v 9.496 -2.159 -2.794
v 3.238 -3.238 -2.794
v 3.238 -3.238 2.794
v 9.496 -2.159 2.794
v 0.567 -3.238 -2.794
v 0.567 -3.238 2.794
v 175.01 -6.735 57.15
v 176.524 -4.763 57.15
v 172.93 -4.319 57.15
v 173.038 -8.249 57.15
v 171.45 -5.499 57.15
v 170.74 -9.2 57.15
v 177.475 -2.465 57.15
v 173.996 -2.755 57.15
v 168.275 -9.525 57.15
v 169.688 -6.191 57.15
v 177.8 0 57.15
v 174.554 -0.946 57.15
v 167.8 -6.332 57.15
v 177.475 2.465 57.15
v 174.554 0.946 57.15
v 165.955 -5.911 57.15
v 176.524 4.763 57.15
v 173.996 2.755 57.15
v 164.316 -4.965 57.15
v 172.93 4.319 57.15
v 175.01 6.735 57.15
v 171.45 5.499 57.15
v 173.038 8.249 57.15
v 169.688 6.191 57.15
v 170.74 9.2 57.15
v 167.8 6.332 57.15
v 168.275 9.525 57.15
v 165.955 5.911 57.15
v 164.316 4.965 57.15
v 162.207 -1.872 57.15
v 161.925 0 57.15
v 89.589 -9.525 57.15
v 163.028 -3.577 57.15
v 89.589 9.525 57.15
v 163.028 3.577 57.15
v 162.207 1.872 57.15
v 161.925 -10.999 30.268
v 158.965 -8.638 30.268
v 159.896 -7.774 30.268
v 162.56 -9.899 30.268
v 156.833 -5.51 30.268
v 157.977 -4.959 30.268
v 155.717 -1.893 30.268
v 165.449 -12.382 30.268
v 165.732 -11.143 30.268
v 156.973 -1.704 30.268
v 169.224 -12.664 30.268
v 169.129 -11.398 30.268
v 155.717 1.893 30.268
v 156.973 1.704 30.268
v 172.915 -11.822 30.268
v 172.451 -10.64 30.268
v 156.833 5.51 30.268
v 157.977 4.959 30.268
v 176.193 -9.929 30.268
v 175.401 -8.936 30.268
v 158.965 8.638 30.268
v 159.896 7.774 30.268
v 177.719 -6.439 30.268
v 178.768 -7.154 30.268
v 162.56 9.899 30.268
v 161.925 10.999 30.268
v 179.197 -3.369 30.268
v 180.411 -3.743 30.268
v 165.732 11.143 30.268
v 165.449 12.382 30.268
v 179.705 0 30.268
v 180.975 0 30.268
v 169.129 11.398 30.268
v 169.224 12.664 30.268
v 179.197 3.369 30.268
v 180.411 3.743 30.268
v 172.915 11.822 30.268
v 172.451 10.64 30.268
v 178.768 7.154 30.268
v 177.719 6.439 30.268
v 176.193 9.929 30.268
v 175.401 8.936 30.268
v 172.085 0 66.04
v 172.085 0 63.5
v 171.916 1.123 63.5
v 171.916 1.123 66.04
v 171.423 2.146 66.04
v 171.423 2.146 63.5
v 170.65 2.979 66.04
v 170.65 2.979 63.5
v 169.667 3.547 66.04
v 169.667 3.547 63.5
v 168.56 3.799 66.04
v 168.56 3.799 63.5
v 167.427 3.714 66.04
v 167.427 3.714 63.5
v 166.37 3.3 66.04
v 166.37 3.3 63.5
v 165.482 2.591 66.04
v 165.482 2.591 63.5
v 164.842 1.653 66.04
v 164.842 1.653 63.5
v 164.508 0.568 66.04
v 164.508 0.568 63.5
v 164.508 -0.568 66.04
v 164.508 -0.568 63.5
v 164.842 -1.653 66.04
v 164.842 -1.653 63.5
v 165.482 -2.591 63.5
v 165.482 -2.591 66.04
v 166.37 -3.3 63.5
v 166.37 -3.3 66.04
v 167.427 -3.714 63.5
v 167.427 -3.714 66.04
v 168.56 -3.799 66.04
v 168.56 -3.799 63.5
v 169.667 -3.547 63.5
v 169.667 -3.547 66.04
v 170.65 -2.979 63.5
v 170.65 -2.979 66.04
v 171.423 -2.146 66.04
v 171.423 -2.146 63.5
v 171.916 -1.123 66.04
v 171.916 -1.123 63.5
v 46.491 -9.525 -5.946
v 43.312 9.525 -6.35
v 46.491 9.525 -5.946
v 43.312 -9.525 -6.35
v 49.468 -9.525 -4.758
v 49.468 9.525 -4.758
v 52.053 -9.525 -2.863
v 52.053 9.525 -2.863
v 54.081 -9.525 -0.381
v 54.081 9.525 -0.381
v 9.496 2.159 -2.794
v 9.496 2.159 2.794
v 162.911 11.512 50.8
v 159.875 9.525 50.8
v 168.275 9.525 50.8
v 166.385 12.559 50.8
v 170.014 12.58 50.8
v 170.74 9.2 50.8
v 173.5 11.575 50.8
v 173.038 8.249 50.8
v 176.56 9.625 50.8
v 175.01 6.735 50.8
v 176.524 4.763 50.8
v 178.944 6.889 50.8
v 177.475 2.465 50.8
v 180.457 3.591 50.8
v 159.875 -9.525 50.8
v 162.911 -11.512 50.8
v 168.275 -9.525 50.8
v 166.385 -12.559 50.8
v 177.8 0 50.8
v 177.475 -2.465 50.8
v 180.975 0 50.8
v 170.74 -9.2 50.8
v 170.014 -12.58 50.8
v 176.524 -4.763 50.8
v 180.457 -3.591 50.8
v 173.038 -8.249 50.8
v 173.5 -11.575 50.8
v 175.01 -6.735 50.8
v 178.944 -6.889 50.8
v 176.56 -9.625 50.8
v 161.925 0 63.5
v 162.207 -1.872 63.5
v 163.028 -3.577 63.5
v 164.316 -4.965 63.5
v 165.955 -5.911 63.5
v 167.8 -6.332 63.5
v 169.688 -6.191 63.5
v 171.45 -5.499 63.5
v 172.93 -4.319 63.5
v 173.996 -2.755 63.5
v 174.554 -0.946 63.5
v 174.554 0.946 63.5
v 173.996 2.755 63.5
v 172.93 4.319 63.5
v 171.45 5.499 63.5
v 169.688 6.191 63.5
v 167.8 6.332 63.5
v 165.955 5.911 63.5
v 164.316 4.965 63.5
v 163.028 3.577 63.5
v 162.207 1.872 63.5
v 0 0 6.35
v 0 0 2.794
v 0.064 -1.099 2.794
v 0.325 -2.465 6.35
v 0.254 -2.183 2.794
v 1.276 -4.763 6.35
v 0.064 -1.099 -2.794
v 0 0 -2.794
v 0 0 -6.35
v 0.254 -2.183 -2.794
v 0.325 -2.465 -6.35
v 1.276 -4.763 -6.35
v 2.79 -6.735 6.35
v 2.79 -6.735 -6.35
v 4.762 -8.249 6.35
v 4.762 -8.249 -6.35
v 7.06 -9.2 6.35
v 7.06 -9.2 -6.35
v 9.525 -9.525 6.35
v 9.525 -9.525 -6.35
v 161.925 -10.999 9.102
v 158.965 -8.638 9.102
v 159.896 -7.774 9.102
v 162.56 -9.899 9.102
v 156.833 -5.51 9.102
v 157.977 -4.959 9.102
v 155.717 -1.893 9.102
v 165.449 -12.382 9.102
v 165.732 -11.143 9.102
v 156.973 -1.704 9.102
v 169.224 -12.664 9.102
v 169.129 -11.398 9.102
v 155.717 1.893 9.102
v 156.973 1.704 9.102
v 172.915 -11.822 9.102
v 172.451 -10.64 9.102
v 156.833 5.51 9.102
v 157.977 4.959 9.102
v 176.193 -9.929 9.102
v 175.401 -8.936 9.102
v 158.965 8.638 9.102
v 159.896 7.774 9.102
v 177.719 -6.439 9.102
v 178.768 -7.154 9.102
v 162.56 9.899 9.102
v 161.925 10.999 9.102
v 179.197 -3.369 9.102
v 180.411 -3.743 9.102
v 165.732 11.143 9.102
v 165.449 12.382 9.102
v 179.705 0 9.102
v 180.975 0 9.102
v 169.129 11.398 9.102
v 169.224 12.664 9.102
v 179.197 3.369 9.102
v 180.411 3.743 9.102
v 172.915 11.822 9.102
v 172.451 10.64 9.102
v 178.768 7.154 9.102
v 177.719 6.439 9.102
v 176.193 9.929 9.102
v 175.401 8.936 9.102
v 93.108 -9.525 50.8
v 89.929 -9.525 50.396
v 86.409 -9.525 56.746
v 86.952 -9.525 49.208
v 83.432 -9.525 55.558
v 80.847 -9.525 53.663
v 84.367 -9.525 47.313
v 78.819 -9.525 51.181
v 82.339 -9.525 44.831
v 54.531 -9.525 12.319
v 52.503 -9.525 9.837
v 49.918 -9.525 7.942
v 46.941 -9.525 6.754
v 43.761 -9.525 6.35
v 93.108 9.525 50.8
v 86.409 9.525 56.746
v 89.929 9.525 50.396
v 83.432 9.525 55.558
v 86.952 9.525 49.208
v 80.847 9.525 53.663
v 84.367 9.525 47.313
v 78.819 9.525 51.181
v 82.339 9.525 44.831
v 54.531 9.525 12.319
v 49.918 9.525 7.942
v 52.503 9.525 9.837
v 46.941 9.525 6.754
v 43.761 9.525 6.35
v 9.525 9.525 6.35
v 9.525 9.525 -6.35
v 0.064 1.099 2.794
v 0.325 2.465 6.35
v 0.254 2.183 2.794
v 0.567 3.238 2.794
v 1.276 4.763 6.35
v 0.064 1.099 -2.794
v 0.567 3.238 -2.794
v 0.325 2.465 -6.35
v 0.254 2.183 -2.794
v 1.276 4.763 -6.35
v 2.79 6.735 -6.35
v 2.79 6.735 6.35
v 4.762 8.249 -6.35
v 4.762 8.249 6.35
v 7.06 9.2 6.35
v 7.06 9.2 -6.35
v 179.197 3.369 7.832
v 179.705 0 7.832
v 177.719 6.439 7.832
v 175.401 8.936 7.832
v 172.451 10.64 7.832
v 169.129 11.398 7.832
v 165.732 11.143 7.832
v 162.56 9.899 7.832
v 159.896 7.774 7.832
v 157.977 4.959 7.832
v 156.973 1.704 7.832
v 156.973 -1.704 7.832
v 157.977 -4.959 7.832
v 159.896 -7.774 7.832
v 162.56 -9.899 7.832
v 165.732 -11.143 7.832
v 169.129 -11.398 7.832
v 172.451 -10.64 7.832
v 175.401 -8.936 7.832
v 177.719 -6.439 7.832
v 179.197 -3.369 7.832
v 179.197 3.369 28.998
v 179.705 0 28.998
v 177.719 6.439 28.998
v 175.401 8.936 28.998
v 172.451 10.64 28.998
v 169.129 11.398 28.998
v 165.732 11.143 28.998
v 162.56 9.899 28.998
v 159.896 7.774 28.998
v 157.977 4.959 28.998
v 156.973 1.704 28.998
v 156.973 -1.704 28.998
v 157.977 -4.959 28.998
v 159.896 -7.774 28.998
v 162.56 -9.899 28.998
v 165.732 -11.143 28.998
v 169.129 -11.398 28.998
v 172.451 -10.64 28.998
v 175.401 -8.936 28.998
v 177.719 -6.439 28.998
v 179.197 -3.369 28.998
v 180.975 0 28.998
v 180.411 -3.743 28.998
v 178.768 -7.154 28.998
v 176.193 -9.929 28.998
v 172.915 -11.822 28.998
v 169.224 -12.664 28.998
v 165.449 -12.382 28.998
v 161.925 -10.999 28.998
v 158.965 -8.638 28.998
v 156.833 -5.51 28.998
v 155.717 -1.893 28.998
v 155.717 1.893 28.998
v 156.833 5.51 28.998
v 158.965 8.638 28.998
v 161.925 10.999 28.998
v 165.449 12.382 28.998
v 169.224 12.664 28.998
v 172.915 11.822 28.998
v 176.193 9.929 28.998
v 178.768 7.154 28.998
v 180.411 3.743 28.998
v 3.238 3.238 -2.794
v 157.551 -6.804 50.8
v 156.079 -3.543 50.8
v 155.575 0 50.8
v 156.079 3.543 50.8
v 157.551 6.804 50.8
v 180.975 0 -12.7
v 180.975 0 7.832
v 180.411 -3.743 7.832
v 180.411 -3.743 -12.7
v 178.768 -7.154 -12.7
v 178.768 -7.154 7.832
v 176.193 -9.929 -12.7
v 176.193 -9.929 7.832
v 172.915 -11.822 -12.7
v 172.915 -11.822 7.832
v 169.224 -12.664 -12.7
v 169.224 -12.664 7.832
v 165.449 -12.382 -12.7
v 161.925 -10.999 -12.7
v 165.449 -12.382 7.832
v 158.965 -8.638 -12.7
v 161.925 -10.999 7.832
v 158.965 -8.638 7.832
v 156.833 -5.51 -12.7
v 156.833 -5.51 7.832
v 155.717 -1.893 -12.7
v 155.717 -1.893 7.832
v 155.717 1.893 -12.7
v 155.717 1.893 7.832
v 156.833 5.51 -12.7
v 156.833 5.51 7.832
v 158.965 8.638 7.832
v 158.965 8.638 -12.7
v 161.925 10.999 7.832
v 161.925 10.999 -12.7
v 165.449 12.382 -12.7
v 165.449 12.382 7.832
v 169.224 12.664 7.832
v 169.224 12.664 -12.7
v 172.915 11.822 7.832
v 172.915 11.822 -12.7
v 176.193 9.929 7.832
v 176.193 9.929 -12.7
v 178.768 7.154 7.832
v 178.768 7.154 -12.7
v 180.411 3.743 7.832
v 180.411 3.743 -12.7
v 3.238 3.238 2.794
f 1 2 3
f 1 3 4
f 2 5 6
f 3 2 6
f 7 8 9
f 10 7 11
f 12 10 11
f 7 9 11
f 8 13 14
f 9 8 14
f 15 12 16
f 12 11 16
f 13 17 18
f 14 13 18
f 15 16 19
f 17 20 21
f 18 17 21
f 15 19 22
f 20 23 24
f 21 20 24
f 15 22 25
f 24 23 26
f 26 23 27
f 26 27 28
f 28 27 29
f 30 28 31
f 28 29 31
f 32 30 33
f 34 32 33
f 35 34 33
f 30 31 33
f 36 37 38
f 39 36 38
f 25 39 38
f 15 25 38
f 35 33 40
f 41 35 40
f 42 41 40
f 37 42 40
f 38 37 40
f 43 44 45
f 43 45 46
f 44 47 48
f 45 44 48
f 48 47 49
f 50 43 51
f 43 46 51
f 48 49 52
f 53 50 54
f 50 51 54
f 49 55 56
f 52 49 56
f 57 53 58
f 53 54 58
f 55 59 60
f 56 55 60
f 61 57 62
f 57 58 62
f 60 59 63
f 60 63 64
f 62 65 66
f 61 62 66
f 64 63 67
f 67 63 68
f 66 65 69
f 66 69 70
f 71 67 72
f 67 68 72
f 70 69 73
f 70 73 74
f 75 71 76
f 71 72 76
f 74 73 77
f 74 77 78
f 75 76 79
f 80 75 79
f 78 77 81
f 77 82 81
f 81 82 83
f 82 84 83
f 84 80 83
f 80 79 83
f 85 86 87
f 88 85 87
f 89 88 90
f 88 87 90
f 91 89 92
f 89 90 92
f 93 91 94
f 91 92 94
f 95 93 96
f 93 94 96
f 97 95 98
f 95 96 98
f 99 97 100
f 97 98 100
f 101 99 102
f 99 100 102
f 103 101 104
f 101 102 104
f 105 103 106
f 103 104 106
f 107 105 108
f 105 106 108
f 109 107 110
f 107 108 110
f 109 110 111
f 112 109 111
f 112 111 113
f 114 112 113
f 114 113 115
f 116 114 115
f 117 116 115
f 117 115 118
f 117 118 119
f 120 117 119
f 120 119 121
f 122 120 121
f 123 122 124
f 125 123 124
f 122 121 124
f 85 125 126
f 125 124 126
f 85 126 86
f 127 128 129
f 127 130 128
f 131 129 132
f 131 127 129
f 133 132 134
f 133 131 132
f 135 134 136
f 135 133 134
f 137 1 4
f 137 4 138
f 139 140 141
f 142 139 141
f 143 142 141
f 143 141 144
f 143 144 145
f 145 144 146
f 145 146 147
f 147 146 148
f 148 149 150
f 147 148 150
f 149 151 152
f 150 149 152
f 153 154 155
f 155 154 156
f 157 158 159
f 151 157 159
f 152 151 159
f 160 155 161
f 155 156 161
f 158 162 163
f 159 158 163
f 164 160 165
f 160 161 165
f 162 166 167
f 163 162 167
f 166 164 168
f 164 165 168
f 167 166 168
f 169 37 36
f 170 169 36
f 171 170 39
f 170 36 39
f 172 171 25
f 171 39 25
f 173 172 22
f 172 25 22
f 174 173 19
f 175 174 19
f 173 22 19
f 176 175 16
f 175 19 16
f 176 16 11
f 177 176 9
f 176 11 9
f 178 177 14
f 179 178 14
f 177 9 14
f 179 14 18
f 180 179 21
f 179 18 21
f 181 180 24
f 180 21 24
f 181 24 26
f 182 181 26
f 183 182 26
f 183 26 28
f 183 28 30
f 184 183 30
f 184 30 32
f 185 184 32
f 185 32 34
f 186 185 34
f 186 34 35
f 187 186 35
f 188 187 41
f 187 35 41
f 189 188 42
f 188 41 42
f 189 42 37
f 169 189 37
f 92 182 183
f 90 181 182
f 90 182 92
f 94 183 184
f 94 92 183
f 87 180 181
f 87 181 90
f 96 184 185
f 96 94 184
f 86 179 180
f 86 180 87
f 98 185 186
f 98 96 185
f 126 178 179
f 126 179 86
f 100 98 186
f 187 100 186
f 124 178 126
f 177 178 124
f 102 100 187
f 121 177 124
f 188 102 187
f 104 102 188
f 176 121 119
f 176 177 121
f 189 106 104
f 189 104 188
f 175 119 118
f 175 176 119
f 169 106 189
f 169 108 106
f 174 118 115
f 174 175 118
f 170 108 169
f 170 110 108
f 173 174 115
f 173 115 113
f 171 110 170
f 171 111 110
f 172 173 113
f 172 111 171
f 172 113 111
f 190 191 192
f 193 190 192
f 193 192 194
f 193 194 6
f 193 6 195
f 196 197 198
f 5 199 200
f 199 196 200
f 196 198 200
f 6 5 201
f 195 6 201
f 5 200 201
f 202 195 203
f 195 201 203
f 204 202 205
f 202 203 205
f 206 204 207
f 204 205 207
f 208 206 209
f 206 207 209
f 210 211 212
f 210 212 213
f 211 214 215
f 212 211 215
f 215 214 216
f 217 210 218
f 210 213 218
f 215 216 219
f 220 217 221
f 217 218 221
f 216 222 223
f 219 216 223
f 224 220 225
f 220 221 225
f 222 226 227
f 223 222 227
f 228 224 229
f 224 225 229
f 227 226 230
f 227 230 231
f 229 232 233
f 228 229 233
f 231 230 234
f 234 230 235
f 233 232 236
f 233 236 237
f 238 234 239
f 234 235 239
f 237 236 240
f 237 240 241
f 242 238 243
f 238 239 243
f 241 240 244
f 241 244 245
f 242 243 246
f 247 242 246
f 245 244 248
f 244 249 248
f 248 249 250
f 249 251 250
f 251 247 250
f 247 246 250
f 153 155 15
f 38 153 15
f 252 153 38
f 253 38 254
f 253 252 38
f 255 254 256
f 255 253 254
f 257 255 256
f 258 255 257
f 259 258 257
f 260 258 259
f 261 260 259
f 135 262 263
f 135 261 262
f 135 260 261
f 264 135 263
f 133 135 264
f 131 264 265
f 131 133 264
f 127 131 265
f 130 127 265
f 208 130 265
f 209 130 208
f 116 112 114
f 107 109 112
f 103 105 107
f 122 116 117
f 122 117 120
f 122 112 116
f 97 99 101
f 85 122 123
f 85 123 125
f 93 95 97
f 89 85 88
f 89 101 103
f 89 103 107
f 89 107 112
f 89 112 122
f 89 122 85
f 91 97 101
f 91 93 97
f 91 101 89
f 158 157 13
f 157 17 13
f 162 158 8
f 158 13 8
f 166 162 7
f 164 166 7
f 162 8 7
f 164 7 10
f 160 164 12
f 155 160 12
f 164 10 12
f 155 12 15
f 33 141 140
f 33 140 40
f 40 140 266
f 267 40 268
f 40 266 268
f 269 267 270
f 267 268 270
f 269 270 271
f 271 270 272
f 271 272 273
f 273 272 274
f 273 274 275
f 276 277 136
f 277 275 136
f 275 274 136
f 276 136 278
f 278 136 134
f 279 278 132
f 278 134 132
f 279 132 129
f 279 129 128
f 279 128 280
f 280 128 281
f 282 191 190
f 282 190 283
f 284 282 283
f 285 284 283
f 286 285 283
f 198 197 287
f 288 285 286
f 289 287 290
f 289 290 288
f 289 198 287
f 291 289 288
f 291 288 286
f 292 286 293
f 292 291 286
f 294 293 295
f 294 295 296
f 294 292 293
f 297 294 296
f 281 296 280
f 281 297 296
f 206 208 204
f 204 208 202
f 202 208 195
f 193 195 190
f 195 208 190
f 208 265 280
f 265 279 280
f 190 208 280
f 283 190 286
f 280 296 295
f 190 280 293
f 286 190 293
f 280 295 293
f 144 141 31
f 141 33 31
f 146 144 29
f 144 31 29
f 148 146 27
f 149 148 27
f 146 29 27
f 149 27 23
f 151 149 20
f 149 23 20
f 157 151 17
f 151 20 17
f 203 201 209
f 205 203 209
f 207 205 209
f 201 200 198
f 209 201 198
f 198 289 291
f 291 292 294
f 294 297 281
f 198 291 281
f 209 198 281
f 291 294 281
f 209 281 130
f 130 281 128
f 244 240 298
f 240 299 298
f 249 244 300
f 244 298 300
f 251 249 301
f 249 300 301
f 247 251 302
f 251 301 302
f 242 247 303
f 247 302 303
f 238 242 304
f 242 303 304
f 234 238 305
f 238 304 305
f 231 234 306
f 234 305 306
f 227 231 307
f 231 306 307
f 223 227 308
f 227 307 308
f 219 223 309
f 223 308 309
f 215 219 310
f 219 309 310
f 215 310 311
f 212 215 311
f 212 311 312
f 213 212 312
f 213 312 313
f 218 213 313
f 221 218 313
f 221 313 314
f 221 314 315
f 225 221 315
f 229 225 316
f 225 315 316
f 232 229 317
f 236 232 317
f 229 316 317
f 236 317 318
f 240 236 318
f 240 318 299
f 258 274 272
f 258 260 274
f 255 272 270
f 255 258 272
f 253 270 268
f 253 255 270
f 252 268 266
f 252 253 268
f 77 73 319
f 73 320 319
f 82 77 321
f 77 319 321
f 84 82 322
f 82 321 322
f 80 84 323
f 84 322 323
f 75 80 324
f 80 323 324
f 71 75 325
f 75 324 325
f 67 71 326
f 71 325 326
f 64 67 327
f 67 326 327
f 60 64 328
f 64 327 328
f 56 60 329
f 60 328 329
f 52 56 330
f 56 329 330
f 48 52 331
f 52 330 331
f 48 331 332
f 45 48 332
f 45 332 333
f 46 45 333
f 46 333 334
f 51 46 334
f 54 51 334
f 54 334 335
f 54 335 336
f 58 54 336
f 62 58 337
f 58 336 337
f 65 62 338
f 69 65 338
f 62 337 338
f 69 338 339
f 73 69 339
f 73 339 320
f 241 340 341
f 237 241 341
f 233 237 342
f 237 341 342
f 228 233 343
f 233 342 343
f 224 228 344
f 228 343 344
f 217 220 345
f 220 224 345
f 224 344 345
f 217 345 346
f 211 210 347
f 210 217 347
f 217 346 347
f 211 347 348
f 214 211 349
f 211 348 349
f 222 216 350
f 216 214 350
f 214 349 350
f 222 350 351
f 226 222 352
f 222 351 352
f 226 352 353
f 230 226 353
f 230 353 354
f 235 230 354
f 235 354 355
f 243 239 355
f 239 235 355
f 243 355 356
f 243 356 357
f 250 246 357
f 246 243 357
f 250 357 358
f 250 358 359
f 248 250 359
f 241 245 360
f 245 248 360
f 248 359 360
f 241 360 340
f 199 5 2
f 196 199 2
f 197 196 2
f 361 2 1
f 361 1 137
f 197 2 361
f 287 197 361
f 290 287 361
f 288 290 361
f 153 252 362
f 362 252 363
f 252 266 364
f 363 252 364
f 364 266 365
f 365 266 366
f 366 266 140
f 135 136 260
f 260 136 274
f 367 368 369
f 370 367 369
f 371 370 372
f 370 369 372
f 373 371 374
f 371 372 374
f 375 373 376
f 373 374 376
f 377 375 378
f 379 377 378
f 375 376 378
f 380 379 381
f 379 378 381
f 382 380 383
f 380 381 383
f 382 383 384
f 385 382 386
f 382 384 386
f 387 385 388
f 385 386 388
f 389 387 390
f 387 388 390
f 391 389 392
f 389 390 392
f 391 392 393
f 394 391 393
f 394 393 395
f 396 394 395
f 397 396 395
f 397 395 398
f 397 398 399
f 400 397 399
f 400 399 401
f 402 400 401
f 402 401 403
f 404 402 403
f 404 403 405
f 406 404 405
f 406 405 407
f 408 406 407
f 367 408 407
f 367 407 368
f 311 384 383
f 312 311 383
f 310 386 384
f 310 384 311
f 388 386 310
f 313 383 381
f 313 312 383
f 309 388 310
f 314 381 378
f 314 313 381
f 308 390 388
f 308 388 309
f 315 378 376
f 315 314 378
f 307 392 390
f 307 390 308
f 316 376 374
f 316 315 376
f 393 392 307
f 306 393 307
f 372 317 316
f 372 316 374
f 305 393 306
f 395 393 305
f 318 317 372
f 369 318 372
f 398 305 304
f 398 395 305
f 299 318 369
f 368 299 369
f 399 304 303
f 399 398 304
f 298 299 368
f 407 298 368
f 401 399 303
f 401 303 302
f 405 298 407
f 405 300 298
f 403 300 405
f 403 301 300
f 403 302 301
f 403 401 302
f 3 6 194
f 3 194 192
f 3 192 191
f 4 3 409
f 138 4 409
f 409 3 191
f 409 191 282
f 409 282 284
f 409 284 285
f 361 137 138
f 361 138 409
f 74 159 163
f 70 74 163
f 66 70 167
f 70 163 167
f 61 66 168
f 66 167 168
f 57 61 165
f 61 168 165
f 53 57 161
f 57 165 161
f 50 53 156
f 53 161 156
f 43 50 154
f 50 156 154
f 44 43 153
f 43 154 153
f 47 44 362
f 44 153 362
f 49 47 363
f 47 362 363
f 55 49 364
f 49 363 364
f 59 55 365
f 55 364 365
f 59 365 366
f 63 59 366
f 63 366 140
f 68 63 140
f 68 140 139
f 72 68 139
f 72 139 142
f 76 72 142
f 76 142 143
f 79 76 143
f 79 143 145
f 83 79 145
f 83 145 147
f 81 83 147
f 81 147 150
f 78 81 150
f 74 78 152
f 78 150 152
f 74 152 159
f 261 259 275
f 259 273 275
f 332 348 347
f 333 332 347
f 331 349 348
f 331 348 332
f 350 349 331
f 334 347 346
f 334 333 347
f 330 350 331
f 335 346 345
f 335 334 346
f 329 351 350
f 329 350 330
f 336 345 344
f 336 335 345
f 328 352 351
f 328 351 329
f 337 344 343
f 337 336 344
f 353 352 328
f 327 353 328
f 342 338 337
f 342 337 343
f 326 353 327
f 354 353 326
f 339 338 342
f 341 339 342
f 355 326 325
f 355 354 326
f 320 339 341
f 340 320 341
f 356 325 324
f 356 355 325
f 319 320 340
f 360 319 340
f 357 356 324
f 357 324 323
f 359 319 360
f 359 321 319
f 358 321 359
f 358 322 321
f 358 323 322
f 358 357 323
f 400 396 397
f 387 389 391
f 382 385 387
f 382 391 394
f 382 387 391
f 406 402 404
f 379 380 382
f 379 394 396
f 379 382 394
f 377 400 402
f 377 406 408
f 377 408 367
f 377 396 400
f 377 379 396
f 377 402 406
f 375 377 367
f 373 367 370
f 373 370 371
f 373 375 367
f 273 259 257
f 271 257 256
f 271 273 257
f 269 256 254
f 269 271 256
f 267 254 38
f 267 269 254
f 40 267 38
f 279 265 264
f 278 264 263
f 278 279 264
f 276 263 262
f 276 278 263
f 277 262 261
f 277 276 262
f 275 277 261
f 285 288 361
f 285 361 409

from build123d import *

# Parameters (mm, degrees)
BOSS_EXTRUDE1_DEPTH    = 9.525
FILLET1_R              = 9.525
FILLET2_R              = 12.7
SKETCH2_R              = 12.7
BOSS_EXTRUDE2_DEPTH    = 63.5
SKETCH4_R              = 12.7
SKETCH4_R_2            = 11.43
CUT_EXTRUDE1_DEPTH     = 0.635
LPATTERN1_COUNT        = 2
LPATTERN1_PITCH        = 21.166666667
SKETCH5_R              = 6.35
BOSS_EXTRUDE3_DEPTH    = 6.35
SKETCH6_R              = 3.81
BOSS_EXTRUDE4_DEPTH    = 2.54
CUT_EXTRUDE2_START     = -1
CUT_EXTRUDE2_OUTLINE_W = 6.477
CUT_EXTRUDE2_OUTLINE_H = 5.588
CUT_EXTRUDE2_DEPTH     = 4.2385
CUT_EXTRUDE2_START_2   = -2.794
CUT_EXTRUDE2_2_DEPTH   = 5.588


with BuildPart() as part:
    # Sketch1 → Boss-Extrude1 (new, symmetric)
    with BuildSketch(Plane(origin=(0, 0, 0), x_dir=(1, 0, 0), z_dir=(0, 1, 0))):
        Polygon((0, -6.35), (0, 6.35), (50.350722524, 6.35), (86.069472524, -50.8), (177.8, -50.8), (177.8, -57.15), (82.55, -57.15), (50.8, -6.35), align=None)
    extrude(amount=BOSS_EXTRUDE1_DEPTH, both=True)

    # Fillet1
    fillet1_edges = [part.edges().sort_by_distance(p)[0] for p in [
        (177.8, -9.525, 53.975),
        (177.8, 9.525, 53.975),
        (0, -9.525, 0),
        (0, 9.525, 0),
    ]]
    fillet(fillet1_edges, radius=FILLET1_R - 0.0001)  # a hair under: the kernel refuses the full size

    # Fillet2
    fillet2_edges = [part.edges().sort_by_distance(p)[0] for p in [
        (50.350722524, 0, -6.35),
        (86.069472524, 0, 50.8),
        (82.55, 0, 57.15),
        (50.8, 0, 6.35),
    ]]
    fillet(fillet2_edges, radius=FILLET2_R)

    # Sketch2 → Boss-Extrude2 (add)
    with BuildSketch(Plane(origin=(0, 0, 50.8), x_dir=(-1, 0, 0), z_dir=(0, 0, -1))):
        with Locations(Location((-168.275, 0, 0), (0, 0, 180))):
            Circle(SKETCH2_R)
    extrude(amount=BOSS_EXTRUDE2_DEPTH)

    # Sketch4 → Cut-Extrude1 (cut, symmetric)
    with BuildSketch(Plane.XY.offset(29.633333333)):
        with Locations((168.275, 0)):
            Circle(SKETCH4_R)
        with Locations((168.275, 0)):
            Circle(SKETCH4_R_2, mode=Mode.SUBTRACT)
    cut_extrude1 = extrude(amount=CUT_EXTRUDE1_DEPTH, both=True, mode=Mode.SUBTRACT)

    # LPattern1: Cut-Extrude1 ×2
    with Locations(*[(0, 0, -i * LPATTERN1_PITCH) for i in range(1, LPATTERN1_COUNT)]):
        add(cut_extrude1, mode=Mode.SUBTRACT)

    # Sketch5 → Boss-Extrude3 (add)
    with BuildSketch(Plane.XY.offset(57.15)):
        with Locations(Location((168.275, 0, 0), (0, 0, 180))):
            Circle(SKETCH5_R)
    extrude(amount=BOSS_EXTRUDE3_DEPTH)

    # Sketch6 → Boss-Extrude4 (add)
    with BuildSketch(Plane.XY.offset(63.5)):
        with Locations((168.275, 0)):
            Circle(SKETCH6_R)
    extrude(amount=BOSS_EXTRUDE4_DEPTH)

    # Cut-Extrude2: read off the stored shape, not the designer's step
    # Cut-Extrude2 outline → Cut-Extrude2 (cut)
    with BuildSketch(Plane.YZ.offset(CUT_EXTRUDE2_START)):
        Rectangle(CUT_EXTRUDE2_OUTLINE_W, CUT_EXTRUDE2_OUTLINE_H)
    extrude(amount=CUT_EXTRUDE2_DEPTH, mode=Mode.SUBTRACT)

    # Cut-Extrude2 2 outline → Cut-Extrude2 2 (cut)
    with BuildSketch(Plane.XY.offset(CUT_EXTRUDE2_START_2)):
        Polygon((9.496069796, -2.159), (9.496069796, 2.159), (3.2385, 3.2385), (3.2385, -3.2385), align=None)
    extrude(amount=CUT_EXTRUDE2_2_DEPTH, mode=Mode.SUBTRACT)


solid = part.part
